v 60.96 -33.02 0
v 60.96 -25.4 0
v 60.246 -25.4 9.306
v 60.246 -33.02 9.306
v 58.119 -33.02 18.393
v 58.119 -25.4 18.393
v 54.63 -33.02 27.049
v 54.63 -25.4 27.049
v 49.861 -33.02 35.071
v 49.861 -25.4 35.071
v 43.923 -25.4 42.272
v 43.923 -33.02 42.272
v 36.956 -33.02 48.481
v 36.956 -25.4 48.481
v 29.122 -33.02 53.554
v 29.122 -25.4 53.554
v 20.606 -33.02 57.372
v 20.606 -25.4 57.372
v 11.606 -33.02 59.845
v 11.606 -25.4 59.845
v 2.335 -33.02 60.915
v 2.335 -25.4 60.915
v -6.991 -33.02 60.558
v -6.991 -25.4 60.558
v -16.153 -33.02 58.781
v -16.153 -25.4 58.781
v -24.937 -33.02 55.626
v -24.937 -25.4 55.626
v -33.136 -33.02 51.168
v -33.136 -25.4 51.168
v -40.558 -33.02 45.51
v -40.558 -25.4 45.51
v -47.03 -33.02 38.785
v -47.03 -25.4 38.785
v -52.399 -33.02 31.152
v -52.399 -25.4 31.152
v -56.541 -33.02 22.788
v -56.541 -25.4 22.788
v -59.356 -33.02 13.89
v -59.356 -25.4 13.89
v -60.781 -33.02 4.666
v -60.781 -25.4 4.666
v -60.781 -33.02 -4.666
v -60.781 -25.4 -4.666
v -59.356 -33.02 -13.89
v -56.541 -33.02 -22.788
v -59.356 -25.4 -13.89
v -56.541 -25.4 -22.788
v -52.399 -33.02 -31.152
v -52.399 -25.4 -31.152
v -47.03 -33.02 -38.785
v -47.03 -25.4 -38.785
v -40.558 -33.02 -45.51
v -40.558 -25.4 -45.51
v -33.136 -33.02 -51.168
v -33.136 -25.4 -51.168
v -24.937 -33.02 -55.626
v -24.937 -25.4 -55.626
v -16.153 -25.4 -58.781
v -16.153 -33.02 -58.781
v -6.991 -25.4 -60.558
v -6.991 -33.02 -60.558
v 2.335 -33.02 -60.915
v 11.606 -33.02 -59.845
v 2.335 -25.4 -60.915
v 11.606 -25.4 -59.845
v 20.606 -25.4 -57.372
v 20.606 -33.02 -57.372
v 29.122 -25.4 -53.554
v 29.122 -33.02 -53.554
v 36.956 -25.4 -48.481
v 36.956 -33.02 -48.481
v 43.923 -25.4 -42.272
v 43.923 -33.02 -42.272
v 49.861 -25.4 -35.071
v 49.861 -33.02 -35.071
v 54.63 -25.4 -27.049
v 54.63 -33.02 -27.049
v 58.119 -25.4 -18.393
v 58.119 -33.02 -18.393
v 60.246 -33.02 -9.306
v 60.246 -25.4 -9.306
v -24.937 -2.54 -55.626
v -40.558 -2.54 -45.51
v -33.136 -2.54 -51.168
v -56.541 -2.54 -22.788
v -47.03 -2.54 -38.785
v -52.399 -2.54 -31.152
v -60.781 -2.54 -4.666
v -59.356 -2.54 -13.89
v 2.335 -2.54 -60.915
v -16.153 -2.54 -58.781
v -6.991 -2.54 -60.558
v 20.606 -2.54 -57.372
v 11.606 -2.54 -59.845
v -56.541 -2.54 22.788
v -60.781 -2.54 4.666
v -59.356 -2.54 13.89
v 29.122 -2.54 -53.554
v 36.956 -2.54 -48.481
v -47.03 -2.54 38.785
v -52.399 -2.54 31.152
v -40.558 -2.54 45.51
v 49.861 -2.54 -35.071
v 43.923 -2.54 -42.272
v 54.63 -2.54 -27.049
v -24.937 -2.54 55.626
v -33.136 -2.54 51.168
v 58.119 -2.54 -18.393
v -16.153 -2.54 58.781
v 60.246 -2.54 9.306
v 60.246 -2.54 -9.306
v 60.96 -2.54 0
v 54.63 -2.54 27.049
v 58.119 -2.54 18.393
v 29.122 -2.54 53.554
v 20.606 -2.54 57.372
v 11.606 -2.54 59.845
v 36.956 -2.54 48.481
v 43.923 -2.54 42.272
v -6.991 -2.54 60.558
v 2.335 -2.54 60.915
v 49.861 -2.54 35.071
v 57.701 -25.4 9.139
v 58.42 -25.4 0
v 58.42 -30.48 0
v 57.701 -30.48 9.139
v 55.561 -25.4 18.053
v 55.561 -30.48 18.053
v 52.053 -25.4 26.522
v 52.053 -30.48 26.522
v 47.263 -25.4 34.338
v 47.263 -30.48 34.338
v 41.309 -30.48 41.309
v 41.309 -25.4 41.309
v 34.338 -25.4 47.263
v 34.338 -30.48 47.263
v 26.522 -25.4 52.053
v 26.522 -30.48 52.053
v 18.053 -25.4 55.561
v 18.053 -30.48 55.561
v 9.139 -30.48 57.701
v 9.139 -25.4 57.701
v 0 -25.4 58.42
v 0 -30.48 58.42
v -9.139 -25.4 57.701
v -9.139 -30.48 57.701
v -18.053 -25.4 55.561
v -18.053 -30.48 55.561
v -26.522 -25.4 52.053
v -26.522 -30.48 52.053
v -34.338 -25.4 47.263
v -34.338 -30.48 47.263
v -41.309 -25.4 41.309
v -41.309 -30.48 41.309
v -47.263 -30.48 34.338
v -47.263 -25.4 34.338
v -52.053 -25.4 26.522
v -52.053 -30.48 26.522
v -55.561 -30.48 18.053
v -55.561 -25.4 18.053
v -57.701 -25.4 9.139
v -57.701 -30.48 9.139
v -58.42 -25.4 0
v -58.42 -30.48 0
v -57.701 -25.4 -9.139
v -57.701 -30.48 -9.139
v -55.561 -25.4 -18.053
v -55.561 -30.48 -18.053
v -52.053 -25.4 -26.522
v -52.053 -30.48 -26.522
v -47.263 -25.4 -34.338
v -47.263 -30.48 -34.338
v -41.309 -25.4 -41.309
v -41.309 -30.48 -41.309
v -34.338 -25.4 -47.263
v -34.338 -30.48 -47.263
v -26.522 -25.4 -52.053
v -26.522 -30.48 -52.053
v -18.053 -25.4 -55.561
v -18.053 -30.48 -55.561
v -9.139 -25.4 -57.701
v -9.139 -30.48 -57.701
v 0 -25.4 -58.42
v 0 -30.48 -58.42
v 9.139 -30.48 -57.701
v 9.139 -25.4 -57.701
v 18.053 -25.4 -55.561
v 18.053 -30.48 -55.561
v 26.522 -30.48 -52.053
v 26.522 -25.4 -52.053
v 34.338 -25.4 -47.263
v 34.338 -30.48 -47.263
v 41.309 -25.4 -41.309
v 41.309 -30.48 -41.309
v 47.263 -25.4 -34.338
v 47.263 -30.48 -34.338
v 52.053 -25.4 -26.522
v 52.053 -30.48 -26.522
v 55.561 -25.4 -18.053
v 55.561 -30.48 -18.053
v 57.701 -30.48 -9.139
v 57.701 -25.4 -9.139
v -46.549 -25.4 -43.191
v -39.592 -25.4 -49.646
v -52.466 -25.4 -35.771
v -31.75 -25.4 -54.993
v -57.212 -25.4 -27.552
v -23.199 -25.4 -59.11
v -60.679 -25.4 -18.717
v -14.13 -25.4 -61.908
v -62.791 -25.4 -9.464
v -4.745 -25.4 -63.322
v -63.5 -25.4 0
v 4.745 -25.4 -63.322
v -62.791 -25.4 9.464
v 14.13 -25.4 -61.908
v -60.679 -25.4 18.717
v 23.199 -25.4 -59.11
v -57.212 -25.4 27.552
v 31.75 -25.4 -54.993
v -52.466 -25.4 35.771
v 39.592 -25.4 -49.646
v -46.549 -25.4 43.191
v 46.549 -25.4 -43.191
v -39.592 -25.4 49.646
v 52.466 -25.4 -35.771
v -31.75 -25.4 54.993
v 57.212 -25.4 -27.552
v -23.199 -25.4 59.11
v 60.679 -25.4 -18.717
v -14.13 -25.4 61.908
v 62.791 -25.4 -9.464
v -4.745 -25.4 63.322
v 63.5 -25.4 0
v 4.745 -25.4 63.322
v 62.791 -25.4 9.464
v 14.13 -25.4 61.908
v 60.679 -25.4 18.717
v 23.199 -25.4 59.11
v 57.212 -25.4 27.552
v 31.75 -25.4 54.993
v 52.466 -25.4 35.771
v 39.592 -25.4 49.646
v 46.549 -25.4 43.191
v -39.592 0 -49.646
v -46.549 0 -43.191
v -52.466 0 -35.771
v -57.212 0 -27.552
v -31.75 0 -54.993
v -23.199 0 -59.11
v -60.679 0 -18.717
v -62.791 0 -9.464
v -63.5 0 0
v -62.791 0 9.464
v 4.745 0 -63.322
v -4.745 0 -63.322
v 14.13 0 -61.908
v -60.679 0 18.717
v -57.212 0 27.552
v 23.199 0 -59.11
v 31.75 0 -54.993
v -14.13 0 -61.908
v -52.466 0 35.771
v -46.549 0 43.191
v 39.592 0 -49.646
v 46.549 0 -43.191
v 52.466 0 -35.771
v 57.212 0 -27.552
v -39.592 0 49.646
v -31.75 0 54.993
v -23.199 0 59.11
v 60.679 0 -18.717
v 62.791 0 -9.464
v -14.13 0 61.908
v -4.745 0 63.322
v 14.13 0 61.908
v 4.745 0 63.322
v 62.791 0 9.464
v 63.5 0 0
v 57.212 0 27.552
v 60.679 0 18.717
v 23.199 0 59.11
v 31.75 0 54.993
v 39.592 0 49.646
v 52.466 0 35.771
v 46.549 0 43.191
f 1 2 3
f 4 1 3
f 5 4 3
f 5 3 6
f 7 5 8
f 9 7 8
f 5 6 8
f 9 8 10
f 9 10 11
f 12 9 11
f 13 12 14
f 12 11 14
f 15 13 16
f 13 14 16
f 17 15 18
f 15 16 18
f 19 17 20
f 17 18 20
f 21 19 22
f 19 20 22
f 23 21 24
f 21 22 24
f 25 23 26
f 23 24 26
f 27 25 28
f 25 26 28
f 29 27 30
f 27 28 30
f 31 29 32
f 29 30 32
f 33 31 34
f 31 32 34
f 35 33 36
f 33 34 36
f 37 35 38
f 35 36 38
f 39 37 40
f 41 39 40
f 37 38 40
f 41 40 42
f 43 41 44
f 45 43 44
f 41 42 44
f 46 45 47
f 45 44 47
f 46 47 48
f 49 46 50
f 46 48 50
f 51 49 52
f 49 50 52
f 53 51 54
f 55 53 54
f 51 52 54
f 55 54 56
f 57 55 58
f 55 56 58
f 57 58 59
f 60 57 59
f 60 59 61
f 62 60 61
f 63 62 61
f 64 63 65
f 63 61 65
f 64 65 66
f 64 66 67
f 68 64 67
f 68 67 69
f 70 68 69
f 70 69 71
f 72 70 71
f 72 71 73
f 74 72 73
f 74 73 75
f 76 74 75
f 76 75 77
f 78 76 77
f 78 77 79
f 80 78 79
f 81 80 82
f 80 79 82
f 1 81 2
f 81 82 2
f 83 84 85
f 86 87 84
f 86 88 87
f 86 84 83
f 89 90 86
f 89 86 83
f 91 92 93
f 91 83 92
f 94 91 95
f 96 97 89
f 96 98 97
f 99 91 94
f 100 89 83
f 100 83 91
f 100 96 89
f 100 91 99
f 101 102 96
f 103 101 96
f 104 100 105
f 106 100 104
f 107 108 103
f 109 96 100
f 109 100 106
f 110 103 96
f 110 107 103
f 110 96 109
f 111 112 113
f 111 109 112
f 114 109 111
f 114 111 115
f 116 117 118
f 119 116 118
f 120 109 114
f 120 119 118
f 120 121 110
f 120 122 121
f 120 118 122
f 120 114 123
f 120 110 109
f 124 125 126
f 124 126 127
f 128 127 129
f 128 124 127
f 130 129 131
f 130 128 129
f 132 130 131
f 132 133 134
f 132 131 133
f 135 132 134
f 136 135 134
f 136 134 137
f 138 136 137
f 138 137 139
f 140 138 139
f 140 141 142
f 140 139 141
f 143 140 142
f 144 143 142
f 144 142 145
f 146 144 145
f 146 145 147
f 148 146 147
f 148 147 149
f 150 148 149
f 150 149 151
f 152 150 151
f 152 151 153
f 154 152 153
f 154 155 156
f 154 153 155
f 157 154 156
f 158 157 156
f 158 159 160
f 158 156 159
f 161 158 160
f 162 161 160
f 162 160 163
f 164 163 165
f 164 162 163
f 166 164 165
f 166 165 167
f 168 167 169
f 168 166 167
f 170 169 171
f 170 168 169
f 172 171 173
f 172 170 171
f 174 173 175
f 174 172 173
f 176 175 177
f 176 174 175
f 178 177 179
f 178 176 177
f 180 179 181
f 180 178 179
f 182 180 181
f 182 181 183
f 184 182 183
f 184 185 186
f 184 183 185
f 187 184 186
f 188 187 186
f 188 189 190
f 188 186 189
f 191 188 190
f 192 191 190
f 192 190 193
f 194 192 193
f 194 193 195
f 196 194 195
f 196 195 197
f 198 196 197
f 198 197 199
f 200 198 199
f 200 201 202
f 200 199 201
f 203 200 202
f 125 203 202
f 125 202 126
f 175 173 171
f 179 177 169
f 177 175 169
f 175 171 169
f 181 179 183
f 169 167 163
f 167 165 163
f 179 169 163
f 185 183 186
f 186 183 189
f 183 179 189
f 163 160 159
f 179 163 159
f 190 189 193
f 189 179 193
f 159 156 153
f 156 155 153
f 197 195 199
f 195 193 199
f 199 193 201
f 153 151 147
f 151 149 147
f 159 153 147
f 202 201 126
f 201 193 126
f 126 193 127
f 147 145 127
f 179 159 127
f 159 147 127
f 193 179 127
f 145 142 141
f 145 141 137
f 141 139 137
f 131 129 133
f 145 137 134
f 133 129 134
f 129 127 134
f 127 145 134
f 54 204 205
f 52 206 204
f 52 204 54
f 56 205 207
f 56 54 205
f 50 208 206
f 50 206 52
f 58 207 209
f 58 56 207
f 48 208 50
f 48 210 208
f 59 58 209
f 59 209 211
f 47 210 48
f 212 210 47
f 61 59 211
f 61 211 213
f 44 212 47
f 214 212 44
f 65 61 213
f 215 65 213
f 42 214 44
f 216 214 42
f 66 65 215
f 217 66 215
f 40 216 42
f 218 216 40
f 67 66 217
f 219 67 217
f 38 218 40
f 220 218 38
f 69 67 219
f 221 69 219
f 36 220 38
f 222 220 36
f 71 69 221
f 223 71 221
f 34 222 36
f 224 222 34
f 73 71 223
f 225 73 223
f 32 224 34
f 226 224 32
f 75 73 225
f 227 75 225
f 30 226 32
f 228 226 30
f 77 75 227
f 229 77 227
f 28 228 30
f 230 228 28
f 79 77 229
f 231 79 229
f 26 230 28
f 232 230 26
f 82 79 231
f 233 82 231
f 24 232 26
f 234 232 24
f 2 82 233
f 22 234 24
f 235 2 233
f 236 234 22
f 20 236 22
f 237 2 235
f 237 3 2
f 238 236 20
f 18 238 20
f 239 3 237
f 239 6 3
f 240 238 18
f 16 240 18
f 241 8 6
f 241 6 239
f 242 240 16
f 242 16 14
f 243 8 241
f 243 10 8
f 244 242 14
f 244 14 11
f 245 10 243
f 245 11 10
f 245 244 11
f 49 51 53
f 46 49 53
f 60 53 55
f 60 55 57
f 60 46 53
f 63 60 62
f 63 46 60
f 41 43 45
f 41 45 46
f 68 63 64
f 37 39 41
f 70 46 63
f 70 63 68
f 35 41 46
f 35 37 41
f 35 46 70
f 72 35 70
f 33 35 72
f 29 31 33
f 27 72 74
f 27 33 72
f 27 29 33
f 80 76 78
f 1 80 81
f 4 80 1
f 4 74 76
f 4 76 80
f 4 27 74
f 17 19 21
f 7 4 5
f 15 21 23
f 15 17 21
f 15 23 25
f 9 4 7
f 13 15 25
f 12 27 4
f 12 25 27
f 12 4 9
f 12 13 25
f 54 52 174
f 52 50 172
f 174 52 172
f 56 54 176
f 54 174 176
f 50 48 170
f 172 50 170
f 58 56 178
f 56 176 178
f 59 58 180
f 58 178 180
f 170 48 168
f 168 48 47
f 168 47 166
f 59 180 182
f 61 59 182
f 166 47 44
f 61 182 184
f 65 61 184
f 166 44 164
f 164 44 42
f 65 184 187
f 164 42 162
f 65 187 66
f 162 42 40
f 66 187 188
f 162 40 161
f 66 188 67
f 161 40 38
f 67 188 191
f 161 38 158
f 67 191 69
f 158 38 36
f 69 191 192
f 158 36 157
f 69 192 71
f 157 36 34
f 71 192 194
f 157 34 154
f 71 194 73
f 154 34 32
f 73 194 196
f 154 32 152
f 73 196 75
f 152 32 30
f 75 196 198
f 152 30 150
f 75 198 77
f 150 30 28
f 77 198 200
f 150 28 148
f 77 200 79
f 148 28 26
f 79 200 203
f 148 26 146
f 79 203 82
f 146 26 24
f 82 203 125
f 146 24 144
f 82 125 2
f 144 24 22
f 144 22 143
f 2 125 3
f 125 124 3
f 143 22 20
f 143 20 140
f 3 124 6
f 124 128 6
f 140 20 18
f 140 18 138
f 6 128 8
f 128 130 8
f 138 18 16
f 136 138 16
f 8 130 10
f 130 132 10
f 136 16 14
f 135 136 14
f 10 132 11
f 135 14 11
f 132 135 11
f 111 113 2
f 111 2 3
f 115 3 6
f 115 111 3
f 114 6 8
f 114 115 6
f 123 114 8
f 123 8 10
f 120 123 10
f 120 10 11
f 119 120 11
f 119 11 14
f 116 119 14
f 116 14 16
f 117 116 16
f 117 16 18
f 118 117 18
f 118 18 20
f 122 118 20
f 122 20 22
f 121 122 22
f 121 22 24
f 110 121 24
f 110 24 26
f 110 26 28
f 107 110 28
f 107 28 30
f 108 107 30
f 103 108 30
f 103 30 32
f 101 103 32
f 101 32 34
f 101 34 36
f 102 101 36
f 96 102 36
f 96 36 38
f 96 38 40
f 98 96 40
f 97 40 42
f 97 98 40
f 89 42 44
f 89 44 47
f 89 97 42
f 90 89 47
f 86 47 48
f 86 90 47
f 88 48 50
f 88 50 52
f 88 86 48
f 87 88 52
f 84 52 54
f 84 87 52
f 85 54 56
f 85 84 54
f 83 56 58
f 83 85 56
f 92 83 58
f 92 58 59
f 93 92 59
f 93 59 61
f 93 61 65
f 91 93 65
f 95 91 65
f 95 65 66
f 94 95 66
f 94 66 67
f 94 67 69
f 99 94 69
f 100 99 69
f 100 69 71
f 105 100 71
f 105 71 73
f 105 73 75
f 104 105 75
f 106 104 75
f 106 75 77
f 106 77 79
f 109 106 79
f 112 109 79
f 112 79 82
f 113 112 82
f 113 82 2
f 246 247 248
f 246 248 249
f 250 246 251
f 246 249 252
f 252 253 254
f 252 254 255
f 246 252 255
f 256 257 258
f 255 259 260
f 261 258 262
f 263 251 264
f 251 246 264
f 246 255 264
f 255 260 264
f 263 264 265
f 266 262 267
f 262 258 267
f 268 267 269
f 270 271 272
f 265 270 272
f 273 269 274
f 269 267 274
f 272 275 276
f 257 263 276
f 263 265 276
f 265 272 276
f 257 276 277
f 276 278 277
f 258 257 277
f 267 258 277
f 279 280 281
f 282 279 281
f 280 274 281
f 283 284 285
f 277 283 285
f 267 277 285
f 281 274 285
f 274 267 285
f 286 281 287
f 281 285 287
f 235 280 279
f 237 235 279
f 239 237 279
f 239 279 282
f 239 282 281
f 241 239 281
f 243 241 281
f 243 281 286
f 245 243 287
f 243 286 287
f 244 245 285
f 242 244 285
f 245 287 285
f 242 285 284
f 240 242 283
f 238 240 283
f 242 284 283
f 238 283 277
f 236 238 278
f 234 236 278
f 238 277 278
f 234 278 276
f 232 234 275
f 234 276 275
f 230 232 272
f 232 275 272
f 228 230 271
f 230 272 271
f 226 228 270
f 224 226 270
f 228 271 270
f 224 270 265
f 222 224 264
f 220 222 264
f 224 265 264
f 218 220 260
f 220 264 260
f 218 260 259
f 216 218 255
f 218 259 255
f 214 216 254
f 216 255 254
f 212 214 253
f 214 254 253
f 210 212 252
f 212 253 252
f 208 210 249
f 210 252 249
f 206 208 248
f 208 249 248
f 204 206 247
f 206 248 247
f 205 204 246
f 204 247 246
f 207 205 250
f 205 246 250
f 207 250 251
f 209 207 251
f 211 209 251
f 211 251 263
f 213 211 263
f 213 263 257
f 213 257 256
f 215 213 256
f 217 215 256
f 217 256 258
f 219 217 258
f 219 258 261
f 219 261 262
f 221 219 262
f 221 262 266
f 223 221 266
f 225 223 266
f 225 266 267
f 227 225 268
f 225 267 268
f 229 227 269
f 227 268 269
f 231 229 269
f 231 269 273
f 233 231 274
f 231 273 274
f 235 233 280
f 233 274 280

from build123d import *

# Parameters (mm, degrees)
F0_R     = 63.5
F1_DEPTH = 25.4
F2_T     = -2.54
F4_R     = 60.96
F3_DEPTH = 7.62
F5_T     = -2.54


with BuildPart() as f1:
    # F0 (on Front) → F1 (new body)
    with BuildSketch(Plane.XZ):
        Circle(F0_R)
    extrude(amount=F1_DEPTH)

    # F2
    f2_openings = [f1.faces().sort_by_distance(p)[0] for p in [
        (0, -25.4, 0),
    ]]
    offset(amount=F2_T, openings=f2_openings)


with BuildPart() as f3:
    # F4 (on face) → F3 (new body)
    with BuildSketch(Plane.XZ.offset(25.4)):
        Circle(F4_R)
    extrude(amount=F3_DEPTH)

    # F5
    f5_openings = [f3.faces().sort_by_distance(p)[0] for p in [
        (0, -25.4, 0),
    ]]
    offset(amount=F5_T, openings=f5_openings)


solid = Compound([f1.part, f3.part])
